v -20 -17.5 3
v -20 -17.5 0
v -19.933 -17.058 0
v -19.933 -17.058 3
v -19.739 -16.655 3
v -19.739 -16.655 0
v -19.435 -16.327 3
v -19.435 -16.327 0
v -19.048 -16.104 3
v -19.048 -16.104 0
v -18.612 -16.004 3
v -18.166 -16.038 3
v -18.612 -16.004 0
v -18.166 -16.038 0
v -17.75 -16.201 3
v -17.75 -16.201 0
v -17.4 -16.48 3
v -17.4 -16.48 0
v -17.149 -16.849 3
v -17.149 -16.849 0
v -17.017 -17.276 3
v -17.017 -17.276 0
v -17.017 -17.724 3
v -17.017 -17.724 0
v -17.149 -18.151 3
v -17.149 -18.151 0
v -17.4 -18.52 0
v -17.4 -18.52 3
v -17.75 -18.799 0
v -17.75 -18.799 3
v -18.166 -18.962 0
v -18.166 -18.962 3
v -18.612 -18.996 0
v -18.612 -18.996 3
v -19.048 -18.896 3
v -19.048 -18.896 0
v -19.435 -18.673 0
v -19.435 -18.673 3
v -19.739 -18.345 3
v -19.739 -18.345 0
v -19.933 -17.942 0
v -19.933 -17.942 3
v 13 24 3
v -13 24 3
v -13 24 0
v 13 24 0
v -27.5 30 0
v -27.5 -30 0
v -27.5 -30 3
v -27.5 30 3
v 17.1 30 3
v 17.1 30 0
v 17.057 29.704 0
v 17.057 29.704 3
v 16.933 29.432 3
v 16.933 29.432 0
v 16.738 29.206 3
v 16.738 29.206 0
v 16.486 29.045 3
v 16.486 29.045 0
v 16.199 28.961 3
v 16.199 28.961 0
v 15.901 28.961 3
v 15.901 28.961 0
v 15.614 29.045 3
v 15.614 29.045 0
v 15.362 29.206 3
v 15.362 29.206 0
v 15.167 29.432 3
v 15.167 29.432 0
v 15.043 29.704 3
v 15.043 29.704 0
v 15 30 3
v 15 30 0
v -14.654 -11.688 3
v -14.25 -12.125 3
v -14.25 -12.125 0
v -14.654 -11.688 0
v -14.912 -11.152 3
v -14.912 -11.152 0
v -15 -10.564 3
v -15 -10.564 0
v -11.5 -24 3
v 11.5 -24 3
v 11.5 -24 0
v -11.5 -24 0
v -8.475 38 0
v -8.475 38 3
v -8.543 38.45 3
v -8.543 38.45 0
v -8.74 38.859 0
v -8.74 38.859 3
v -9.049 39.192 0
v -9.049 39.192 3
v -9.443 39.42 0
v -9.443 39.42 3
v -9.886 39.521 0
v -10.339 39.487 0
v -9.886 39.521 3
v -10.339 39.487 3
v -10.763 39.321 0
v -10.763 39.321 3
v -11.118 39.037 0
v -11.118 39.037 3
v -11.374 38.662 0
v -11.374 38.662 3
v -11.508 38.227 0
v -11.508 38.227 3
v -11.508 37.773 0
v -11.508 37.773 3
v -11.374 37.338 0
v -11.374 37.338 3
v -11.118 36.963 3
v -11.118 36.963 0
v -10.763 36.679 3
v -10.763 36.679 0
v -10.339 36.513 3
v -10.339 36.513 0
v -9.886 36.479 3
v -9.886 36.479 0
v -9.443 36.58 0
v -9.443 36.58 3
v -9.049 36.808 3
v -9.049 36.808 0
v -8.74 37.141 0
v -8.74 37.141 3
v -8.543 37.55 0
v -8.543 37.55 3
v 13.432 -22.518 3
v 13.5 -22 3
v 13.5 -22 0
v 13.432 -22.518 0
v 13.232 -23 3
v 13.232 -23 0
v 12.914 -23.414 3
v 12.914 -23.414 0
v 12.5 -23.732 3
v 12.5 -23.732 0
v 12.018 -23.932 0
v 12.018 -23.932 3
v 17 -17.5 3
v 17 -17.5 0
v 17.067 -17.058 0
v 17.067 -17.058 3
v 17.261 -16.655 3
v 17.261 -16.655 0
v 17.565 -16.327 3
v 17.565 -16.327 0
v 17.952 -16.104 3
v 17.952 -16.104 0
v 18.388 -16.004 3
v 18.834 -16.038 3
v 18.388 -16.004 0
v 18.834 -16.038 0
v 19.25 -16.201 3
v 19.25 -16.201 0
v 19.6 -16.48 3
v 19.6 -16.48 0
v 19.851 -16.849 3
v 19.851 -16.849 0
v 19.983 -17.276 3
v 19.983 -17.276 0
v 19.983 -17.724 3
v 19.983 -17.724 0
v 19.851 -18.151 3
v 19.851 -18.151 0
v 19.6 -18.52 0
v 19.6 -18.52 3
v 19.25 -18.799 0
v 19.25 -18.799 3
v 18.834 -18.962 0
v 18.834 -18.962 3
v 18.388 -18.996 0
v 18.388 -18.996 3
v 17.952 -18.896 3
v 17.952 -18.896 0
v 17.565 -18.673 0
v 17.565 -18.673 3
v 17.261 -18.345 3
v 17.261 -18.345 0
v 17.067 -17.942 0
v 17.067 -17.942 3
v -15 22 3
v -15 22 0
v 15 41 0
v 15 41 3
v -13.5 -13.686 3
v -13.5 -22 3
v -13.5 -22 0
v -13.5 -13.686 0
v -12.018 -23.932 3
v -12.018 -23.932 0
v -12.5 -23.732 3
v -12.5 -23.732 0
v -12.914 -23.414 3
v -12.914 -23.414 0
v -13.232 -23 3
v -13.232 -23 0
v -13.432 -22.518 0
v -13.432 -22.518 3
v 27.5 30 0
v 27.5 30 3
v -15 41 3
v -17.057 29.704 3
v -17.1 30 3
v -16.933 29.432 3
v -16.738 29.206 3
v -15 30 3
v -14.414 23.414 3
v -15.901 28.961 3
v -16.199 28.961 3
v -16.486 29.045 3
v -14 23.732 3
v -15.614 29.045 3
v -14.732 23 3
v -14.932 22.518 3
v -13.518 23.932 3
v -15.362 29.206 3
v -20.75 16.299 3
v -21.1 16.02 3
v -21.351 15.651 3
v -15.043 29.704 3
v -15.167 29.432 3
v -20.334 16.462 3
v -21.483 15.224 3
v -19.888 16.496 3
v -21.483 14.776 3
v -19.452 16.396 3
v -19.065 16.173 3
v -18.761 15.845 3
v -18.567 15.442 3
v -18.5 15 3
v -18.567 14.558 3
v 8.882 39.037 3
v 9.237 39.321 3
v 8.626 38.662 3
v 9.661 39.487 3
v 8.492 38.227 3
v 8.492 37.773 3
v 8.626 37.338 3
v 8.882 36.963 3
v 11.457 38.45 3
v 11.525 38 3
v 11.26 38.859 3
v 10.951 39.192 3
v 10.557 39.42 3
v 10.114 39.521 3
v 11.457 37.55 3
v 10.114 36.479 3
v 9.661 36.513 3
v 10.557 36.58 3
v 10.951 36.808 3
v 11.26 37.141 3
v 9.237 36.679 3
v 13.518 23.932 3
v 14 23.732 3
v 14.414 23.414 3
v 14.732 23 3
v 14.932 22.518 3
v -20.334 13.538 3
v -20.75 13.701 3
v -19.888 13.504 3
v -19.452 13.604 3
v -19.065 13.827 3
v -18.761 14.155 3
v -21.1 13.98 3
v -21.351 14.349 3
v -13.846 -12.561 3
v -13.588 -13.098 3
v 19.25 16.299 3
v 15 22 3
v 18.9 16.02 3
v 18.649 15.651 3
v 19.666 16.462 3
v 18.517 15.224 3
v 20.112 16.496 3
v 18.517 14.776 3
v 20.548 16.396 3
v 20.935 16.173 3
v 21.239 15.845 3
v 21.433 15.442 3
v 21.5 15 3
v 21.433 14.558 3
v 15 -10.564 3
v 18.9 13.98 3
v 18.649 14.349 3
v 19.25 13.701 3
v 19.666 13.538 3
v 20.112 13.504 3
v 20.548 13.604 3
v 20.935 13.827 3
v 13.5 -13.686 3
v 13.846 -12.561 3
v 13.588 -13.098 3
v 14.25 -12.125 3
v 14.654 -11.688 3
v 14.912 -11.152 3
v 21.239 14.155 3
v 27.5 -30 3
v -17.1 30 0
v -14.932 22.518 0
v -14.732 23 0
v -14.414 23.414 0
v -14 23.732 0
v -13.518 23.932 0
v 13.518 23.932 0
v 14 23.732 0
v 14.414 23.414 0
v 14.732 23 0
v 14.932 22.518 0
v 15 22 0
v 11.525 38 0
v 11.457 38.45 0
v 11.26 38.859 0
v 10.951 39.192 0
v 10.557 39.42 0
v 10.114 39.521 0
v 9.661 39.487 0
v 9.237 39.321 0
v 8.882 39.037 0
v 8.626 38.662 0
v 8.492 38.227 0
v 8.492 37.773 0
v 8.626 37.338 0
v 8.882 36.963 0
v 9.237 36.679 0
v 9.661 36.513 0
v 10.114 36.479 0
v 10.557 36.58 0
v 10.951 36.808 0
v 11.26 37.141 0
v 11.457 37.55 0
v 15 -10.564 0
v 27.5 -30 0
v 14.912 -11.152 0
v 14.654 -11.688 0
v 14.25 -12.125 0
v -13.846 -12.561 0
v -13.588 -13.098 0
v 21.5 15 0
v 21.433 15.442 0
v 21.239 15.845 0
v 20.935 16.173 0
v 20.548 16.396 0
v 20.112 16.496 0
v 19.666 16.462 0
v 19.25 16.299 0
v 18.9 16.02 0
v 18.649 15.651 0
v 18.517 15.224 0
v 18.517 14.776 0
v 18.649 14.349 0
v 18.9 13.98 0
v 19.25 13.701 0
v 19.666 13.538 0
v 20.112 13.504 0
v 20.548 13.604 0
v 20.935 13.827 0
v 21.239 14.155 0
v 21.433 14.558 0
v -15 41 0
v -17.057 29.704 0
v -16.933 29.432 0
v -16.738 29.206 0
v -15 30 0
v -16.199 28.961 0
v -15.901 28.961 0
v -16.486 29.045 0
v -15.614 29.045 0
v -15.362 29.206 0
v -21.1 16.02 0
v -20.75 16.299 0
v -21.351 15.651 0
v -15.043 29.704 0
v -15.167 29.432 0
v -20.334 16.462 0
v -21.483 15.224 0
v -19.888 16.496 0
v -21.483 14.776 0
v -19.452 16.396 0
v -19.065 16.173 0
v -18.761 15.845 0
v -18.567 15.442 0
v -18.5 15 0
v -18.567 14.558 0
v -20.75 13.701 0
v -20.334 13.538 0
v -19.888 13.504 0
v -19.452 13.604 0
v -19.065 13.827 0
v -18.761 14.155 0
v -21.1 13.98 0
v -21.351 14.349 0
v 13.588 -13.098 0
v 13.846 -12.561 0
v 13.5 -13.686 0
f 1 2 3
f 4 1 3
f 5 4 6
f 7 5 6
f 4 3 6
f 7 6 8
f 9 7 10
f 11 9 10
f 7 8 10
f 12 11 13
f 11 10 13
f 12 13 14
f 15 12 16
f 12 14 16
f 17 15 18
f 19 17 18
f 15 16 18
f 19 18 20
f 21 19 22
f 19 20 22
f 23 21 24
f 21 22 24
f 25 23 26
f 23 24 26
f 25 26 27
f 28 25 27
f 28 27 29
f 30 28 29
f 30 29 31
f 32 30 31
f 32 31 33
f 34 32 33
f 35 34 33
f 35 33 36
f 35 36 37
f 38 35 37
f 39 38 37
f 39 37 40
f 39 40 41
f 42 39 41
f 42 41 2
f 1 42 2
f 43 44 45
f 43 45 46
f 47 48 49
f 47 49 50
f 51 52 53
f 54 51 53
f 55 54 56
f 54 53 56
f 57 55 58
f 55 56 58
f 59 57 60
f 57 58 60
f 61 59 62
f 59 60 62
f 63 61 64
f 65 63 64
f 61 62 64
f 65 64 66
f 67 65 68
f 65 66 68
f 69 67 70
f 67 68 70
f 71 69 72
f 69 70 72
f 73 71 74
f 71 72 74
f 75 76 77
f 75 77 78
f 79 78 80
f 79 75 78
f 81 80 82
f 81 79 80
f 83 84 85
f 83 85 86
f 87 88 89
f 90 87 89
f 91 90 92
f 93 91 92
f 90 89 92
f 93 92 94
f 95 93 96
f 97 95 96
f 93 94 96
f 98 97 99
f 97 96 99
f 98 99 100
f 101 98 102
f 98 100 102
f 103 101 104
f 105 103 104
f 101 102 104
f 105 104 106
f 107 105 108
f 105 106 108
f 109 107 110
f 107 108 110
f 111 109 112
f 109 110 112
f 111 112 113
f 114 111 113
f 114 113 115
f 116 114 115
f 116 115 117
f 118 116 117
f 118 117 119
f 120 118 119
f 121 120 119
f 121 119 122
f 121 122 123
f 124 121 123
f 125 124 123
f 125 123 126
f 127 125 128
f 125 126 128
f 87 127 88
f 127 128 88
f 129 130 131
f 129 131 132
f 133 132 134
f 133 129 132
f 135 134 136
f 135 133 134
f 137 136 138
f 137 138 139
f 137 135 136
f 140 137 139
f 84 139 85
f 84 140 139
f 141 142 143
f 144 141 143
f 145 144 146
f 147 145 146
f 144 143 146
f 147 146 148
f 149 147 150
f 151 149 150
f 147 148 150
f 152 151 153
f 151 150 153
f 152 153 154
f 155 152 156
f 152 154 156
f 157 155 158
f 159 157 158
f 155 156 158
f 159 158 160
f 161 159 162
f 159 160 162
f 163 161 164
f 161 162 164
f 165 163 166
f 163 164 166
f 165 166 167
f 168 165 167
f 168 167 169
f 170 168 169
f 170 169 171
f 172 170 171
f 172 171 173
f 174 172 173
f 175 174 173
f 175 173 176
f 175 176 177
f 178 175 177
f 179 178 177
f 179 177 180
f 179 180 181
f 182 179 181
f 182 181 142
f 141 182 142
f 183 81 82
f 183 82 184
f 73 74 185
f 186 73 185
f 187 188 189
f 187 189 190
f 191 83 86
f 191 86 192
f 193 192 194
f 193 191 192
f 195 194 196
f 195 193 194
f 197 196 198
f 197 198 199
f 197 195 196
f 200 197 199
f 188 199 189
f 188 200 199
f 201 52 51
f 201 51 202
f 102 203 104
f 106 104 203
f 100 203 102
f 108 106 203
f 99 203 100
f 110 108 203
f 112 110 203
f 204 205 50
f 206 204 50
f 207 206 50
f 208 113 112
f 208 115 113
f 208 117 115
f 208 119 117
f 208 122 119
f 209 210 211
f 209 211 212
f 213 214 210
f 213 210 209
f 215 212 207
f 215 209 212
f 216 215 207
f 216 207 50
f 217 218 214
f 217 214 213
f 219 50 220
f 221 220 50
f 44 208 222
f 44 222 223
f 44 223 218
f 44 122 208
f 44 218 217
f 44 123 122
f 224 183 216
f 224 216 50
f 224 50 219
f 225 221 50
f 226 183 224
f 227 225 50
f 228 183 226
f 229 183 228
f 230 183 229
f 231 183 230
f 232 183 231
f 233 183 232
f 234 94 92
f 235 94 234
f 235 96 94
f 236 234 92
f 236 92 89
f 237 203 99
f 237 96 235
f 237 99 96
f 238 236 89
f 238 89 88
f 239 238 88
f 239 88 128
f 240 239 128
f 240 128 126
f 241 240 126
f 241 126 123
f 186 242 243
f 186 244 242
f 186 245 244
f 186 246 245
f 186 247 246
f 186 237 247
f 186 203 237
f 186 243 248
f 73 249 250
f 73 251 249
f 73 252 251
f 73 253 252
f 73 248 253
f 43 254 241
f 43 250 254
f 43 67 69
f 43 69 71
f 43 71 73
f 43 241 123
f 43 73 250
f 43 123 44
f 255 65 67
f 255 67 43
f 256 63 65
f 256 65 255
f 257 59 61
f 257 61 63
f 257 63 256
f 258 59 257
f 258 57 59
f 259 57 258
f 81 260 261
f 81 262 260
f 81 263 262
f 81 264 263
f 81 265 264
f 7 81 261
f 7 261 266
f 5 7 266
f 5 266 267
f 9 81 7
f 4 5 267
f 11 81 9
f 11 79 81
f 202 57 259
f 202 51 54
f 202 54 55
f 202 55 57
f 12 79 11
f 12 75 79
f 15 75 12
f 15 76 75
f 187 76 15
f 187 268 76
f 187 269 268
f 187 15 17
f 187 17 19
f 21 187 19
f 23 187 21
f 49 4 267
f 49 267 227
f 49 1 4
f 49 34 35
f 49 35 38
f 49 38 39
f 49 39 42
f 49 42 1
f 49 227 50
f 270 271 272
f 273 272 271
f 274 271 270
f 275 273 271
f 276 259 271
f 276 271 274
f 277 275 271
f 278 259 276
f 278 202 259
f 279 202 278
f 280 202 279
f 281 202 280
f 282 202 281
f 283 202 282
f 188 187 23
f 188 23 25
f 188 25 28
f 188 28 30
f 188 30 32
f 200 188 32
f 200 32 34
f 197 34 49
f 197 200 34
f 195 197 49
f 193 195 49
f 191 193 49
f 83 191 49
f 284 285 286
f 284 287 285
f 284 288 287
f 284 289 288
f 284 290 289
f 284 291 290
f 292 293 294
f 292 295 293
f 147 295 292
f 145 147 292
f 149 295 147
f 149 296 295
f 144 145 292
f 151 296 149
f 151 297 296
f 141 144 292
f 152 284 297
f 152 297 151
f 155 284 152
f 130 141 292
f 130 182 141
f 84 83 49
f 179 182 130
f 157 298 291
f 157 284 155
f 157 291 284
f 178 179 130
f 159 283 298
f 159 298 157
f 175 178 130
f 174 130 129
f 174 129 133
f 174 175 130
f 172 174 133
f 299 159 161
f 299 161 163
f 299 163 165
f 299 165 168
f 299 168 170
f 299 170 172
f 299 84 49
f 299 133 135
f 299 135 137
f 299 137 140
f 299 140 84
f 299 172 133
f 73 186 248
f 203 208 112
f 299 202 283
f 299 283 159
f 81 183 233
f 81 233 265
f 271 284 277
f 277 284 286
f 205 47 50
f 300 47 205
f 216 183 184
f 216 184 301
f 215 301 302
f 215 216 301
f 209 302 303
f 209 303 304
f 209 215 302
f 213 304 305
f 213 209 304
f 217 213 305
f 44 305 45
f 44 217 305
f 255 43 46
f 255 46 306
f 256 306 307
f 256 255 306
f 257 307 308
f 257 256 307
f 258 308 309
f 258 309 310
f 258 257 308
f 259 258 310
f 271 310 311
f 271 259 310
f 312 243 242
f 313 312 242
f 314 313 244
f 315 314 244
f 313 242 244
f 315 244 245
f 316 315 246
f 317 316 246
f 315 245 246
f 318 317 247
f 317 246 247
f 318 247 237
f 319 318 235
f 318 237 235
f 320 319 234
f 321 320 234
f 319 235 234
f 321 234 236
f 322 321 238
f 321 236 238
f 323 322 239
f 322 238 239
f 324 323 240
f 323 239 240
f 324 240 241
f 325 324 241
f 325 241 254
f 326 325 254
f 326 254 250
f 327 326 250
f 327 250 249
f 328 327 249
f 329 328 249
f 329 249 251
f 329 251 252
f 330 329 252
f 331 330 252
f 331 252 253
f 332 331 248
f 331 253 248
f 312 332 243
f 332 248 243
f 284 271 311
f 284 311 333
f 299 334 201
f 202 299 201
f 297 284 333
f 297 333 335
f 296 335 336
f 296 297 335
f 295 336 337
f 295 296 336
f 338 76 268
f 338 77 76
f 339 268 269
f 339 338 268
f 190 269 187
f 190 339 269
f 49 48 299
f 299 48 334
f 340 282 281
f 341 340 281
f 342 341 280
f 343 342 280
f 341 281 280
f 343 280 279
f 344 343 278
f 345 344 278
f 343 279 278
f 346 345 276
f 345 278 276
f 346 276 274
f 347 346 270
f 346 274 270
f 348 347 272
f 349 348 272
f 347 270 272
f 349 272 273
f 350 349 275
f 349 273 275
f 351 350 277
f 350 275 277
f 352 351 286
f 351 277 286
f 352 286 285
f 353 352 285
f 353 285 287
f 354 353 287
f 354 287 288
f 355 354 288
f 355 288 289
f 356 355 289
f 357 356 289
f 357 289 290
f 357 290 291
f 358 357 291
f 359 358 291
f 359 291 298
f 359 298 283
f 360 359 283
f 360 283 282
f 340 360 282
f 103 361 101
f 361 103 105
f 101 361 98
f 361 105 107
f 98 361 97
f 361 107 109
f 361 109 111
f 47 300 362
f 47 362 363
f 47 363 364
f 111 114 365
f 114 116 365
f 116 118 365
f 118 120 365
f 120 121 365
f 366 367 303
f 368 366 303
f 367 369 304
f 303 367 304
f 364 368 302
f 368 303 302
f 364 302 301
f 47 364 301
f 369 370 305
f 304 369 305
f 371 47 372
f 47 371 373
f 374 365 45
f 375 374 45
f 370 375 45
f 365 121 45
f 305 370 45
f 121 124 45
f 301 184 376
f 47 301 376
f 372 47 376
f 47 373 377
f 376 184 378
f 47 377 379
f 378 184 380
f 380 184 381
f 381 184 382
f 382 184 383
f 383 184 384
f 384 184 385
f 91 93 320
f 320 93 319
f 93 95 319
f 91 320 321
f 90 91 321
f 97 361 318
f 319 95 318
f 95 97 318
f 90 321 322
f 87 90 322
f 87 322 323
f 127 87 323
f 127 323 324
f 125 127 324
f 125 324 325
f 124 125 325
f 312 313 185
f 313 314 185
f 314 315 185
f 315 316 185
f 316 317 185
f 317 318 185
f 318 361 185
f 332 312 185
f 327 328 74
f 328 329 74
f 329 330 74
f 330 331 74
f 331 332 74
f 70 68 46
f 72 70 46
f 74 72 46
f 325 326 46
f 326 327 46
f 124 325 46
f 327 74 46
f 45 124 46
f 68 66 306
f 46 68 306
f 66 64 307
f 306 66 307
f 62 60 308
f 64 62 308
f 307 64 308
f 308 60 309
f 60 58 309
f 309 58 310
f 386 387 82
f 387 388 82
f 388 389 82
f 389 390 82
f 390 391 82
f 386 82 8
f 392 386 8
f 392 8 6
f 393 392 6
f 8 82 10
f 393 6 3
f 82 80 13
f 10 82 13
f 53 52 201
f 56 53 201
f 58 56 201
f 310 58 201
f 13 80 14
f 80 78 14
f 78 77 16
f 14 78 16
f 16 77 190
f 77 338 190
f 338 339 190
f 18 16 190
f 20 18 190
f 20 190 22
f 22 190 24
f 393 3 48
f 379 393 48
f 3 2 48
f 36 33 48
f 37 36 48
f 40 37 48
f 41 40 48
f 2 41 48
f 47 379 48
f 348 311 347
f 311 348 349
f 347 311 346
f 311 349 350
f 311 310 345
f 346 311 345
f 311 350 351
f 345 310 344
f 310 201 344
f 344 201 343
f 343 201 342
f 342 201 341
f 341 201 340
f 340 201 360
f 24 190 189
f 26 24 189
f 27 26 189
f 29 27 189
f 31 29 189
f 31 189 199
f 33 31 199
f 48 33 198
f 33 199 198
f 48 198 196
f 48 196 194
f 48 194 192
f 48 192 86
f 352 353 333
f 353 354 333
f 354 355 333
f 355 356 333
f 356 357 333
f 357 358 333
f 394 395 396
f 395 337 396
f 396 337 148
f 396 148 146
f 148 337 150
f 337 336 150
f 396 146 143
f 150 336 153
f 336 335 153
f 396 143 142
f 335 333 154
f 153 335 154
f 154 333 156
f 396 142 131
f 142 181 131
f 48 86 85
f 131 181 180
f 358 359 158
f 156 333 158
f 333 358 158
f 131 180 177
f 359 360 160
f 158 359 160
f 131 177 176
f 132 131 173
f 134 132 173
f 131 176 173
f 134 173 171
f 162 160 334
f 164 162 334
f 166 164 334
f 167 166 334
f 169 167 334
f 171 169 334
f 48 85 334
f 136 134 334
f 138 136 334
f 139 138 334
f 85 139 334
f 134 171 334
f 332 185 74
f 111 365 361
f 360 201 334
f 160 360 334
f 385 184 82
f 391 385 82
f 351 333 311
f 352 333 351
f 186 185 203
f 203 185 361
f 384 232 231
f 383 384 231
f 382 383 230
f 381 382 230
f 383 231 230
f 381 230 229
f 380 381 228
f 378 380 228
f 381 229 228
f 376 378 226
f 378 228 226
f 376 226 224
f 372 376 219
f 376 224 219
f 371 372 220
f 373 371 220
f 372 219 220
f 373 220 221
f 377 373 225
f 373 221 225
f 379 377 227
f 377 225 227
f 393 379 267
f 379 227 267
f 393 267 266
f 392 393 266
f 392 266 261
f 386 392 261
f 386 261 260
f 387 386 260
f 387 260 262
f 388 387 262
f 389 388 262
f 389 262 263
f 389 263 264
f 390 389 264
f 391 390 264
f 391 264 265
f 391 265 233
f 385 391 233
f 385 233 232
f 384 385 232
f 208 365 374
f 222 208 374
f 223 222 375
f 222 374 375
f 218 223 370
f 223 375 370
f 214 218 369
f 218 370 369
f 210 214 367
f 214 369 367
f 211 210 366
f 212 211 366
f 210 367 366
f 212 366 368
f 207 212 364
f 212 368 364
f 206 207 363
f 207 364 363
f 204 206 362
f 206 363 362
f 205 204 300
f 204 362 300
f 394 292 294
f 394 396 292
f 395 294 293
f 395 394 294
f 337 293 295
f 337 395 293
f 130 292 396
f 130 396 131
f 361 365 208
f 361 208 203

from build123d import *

# Parameters (mm, degrees)
SKETCH_1_W          = 55
SKETCH_1_H          = 60
EXTRUDE_1_DEPTH     = 3
SKETCH_2_W          = 30
SKETCH_2_H          = 22
EXTRUDE_2_DEPTH     = 3
SKETCH_3_R          = 1.05
CUT_EXTRUDE_1_DEPTH = 3
SKETCH_4_R          = 1.525
CUT_EXTRUDE_2_DEPTH = 3
SKETCH_5_R          = 1.5
CUT_EXTRUDE_3_DEPTH = 10
SKETCH_6_R          = 1.5
CUT_EXTRUDE_4_DEPTH = 10
CUT_EXTRUDE_5_DEPTH = 10
FILLET_1_R          = 2
FILLET_2_R          = 2


with BuildPart() as part:
    # 草图1 → 凸台-拉伸1 (new body)
    with BuildSketch(Plane.XY):
        Rectangle(SKETCH_1_W, SKETCH_1_H)
    extrude(amount=EXTRUDE_1_DEPTH)

    # 草图2 → 凸台-拉伸2 (add)
    with BuildSketch(Plane(origin=(0, 0, 0), x_dir=(-1, 0, 0), z_dir=(0, 0, -1))):
        with Locations((0, 30)):
            Rectangle(SKETCH_2_W, SKETCH_2_H)
    extrude(amount=-EXTRUDE_2_DEPTH)

    # 草图3 → 切除-拉伸1 (cut)
    with BuildSketch(Plane(origin=(0, 0, 0), x_dir=(-1, 0, 0), z_dir=(0, 0, -1))):
        with Locations((-16.05, 30)):
            Circle(SKETCH_3_R)
        with Locations((16.05, 30)):
            Circle(SKETCH_3_R)
    extrude(amount=-CUT_EXTRUDE_1_DEPTH, mode=Mode.SUBTRACT)

    # 草图4 → 切除-拉伸2 (cut)
    with BuildSketch(Plane.XY.offset(3)):
        with Locations((-10, 38)):
            Circle(SKETCH_4_R)
        with Locations((10, 38)):
            Circle(SKETCH_4_R)
    extrude(amount=-CUT_EXTRUDE_2_DEPTH, mode=Mode.SUBTRACT)

    # 草图5 → 切除-拉伸3 (cut)
    with BuildSketch(Plane(origin=(0, 0, 0), x_dir=(-1, 0, 0), z_dir=(0, 0, -1))):
        with Locations((-18.5, -17.5)):
            Circle(SKETCH_5_R)
        with Locations((18.5, -17.5)):
            Circle(SKETCH_5_R)
    extrude(amount=-CUT_EXTRUDE_3_DEPTH, mode=Mode.SUBTRACT)

    # 草图6 → 切除-拉伸4 (cut)
    with BuildSketch(Plane.XY.offset(3)):
        with Locations((20, 15)):
            Circle(SKETCH_6_R)
        with Locations((-20, 15)):
            Circle(SKETCH_6_R)
    extrude(amount=-CUT_EXTRUDE_4_DEPTH, mode=Mode.SUBTRACT)

    # 草图7 → 切除-拉伸5 (cut)
    with BuildSketch(Plane.XY.offset(3)):
        Polygon((-15, 24), (15, 24), (15, -12.5), (13.5, -12.5), (13.5, -24), (-13.5, -24), (-13.5, -12.5), (-15, -12.5), align=None)
    extrude(amount=-CUT_EXTRUDE_5_DEPTH, mode=Mode.SUBTRACT)

    # 圆角1
    # the kernel refuses this fillet: 2 mm, written as the material it adds along each edge
    with BuildSketch(Plane(origin=(-15, 24, 3), x_dir=(0, -1, 0), z_dir=(0, 0, -1))) as fillet_1_piece_1:
        with BuildLine():
            CenterArc((FILLET_1_R, -FILLET_1_R), FILLET_1_R, 90, 90)
            Line((0, -FILLET_1_R), (-FILLET_1_R * 0.02, -FILLET_1_R))
            Line((-FILLET_1_R * 0.02, -FILLET_1_R), (-FILLET_1_R * 0.02, FILLET_1_R * 0.02))
            Line((-FILLET_1_R * 0.02, FILLET_1_R * 0.02), (FILLET_1_R, FILLET_1_R * 0.02))
            Line((FILLET_1_R, FILLET_1_R * 0.02), (FILLET_1_R, 0))
        make_face()
    extrude(amount=3)
    with BuildSketch(Plane(origin=(15, 24, 3), x_dir=(0, -1, 0), z_dir=(0, 0, -1)), Plane(origin=(-13.5, -24, 3), x_dir=(0, 1, 0), z_dir=(0, 0, -1)), Plane(origin=(13.5, -24, 3), x_dir=(-1, 0, 0), z_dir=(0, 0, -1))) as fillet_1_piece_2:
        with BuildLine():
            CenterArc((FILLET_1_R, FILLET_1_R), FILLET_1_R, 180, 90)
            Line((0, FILLET_1_R), (-FILLET_1_R * 0.02, FILLET_1_R))
            Line((-FILLET_1_R * 0.02, FILLET_1_R), (-FILLET_1_R * 0.02, -FILLET_1_R * 0.02))
            Line((-FILLET_1_R * 0.02, -FILLET_1_R * 0.02), (FILLET_1_R, -FILLET_1_R * 0.02))
            Line((FILLET_1_R, -FILLET_1_R * 0.02), (FILLET_1_R, 0))
        make_face()
    extrude(amount=3)
    with BuildSketch(Plane(origin=(15, -12.5, 3), x_dir=(-1, 0, 0), z_dir=(0, 0, -1))) as fillet_1_piece_3:
        with BuildLine():
            CenterArc((2, 1.936491673), FILLET_1_R, 180, 75.522487814)
            Line((0, 1.936491673), (-0.04, 1.936491673))
            Line((-0.04, 1.936491673), (-0.04, 0))
            Line((-0.04, 0), (0, -0.04))
            ThreePointArc((0, -0.04), (0.75, -0.04), (1.49, -0.038729833))
            Line((1.49, -0.038729833), (1.5, 0))
        make_face()
    extrude(amount=3)
    with BuildSketch(Plane(origin=(-15, -12.5, 3), x_dir=(0, 1, 0), z_dir=(0, 0, -1))) as fillet_1_piece_4:
        with BuildLine():
            CenterArc((1.936491673, 2), FILLET_1_R, 194.477512186, 75.522487814)
            Line((0, 1.5), (-0.038729833, 1.49))
            ThreePointArc((-0.038729833, 1.49), (-0.04, 0.75), (-0.04, 0))
            Line((-0.04, 0), (0, -0.04))
            Line((0, -0.04), (1.936491673, -0.04))
            Line((1.936491673, -0.04), (1.936491673, 0))
        make_face()
    extrude(amount=3)

    # 圆角2
    fillet_2_edges = [part.edges().sort_by_distance(p)[0] for p in [
        (13.5, -12.5, 1.5),
        (-13.5, -12.5, 1.5),
    ]]
    fillet(fillet_2_edges, radius=FILLET_2_R)


solid = part.part
